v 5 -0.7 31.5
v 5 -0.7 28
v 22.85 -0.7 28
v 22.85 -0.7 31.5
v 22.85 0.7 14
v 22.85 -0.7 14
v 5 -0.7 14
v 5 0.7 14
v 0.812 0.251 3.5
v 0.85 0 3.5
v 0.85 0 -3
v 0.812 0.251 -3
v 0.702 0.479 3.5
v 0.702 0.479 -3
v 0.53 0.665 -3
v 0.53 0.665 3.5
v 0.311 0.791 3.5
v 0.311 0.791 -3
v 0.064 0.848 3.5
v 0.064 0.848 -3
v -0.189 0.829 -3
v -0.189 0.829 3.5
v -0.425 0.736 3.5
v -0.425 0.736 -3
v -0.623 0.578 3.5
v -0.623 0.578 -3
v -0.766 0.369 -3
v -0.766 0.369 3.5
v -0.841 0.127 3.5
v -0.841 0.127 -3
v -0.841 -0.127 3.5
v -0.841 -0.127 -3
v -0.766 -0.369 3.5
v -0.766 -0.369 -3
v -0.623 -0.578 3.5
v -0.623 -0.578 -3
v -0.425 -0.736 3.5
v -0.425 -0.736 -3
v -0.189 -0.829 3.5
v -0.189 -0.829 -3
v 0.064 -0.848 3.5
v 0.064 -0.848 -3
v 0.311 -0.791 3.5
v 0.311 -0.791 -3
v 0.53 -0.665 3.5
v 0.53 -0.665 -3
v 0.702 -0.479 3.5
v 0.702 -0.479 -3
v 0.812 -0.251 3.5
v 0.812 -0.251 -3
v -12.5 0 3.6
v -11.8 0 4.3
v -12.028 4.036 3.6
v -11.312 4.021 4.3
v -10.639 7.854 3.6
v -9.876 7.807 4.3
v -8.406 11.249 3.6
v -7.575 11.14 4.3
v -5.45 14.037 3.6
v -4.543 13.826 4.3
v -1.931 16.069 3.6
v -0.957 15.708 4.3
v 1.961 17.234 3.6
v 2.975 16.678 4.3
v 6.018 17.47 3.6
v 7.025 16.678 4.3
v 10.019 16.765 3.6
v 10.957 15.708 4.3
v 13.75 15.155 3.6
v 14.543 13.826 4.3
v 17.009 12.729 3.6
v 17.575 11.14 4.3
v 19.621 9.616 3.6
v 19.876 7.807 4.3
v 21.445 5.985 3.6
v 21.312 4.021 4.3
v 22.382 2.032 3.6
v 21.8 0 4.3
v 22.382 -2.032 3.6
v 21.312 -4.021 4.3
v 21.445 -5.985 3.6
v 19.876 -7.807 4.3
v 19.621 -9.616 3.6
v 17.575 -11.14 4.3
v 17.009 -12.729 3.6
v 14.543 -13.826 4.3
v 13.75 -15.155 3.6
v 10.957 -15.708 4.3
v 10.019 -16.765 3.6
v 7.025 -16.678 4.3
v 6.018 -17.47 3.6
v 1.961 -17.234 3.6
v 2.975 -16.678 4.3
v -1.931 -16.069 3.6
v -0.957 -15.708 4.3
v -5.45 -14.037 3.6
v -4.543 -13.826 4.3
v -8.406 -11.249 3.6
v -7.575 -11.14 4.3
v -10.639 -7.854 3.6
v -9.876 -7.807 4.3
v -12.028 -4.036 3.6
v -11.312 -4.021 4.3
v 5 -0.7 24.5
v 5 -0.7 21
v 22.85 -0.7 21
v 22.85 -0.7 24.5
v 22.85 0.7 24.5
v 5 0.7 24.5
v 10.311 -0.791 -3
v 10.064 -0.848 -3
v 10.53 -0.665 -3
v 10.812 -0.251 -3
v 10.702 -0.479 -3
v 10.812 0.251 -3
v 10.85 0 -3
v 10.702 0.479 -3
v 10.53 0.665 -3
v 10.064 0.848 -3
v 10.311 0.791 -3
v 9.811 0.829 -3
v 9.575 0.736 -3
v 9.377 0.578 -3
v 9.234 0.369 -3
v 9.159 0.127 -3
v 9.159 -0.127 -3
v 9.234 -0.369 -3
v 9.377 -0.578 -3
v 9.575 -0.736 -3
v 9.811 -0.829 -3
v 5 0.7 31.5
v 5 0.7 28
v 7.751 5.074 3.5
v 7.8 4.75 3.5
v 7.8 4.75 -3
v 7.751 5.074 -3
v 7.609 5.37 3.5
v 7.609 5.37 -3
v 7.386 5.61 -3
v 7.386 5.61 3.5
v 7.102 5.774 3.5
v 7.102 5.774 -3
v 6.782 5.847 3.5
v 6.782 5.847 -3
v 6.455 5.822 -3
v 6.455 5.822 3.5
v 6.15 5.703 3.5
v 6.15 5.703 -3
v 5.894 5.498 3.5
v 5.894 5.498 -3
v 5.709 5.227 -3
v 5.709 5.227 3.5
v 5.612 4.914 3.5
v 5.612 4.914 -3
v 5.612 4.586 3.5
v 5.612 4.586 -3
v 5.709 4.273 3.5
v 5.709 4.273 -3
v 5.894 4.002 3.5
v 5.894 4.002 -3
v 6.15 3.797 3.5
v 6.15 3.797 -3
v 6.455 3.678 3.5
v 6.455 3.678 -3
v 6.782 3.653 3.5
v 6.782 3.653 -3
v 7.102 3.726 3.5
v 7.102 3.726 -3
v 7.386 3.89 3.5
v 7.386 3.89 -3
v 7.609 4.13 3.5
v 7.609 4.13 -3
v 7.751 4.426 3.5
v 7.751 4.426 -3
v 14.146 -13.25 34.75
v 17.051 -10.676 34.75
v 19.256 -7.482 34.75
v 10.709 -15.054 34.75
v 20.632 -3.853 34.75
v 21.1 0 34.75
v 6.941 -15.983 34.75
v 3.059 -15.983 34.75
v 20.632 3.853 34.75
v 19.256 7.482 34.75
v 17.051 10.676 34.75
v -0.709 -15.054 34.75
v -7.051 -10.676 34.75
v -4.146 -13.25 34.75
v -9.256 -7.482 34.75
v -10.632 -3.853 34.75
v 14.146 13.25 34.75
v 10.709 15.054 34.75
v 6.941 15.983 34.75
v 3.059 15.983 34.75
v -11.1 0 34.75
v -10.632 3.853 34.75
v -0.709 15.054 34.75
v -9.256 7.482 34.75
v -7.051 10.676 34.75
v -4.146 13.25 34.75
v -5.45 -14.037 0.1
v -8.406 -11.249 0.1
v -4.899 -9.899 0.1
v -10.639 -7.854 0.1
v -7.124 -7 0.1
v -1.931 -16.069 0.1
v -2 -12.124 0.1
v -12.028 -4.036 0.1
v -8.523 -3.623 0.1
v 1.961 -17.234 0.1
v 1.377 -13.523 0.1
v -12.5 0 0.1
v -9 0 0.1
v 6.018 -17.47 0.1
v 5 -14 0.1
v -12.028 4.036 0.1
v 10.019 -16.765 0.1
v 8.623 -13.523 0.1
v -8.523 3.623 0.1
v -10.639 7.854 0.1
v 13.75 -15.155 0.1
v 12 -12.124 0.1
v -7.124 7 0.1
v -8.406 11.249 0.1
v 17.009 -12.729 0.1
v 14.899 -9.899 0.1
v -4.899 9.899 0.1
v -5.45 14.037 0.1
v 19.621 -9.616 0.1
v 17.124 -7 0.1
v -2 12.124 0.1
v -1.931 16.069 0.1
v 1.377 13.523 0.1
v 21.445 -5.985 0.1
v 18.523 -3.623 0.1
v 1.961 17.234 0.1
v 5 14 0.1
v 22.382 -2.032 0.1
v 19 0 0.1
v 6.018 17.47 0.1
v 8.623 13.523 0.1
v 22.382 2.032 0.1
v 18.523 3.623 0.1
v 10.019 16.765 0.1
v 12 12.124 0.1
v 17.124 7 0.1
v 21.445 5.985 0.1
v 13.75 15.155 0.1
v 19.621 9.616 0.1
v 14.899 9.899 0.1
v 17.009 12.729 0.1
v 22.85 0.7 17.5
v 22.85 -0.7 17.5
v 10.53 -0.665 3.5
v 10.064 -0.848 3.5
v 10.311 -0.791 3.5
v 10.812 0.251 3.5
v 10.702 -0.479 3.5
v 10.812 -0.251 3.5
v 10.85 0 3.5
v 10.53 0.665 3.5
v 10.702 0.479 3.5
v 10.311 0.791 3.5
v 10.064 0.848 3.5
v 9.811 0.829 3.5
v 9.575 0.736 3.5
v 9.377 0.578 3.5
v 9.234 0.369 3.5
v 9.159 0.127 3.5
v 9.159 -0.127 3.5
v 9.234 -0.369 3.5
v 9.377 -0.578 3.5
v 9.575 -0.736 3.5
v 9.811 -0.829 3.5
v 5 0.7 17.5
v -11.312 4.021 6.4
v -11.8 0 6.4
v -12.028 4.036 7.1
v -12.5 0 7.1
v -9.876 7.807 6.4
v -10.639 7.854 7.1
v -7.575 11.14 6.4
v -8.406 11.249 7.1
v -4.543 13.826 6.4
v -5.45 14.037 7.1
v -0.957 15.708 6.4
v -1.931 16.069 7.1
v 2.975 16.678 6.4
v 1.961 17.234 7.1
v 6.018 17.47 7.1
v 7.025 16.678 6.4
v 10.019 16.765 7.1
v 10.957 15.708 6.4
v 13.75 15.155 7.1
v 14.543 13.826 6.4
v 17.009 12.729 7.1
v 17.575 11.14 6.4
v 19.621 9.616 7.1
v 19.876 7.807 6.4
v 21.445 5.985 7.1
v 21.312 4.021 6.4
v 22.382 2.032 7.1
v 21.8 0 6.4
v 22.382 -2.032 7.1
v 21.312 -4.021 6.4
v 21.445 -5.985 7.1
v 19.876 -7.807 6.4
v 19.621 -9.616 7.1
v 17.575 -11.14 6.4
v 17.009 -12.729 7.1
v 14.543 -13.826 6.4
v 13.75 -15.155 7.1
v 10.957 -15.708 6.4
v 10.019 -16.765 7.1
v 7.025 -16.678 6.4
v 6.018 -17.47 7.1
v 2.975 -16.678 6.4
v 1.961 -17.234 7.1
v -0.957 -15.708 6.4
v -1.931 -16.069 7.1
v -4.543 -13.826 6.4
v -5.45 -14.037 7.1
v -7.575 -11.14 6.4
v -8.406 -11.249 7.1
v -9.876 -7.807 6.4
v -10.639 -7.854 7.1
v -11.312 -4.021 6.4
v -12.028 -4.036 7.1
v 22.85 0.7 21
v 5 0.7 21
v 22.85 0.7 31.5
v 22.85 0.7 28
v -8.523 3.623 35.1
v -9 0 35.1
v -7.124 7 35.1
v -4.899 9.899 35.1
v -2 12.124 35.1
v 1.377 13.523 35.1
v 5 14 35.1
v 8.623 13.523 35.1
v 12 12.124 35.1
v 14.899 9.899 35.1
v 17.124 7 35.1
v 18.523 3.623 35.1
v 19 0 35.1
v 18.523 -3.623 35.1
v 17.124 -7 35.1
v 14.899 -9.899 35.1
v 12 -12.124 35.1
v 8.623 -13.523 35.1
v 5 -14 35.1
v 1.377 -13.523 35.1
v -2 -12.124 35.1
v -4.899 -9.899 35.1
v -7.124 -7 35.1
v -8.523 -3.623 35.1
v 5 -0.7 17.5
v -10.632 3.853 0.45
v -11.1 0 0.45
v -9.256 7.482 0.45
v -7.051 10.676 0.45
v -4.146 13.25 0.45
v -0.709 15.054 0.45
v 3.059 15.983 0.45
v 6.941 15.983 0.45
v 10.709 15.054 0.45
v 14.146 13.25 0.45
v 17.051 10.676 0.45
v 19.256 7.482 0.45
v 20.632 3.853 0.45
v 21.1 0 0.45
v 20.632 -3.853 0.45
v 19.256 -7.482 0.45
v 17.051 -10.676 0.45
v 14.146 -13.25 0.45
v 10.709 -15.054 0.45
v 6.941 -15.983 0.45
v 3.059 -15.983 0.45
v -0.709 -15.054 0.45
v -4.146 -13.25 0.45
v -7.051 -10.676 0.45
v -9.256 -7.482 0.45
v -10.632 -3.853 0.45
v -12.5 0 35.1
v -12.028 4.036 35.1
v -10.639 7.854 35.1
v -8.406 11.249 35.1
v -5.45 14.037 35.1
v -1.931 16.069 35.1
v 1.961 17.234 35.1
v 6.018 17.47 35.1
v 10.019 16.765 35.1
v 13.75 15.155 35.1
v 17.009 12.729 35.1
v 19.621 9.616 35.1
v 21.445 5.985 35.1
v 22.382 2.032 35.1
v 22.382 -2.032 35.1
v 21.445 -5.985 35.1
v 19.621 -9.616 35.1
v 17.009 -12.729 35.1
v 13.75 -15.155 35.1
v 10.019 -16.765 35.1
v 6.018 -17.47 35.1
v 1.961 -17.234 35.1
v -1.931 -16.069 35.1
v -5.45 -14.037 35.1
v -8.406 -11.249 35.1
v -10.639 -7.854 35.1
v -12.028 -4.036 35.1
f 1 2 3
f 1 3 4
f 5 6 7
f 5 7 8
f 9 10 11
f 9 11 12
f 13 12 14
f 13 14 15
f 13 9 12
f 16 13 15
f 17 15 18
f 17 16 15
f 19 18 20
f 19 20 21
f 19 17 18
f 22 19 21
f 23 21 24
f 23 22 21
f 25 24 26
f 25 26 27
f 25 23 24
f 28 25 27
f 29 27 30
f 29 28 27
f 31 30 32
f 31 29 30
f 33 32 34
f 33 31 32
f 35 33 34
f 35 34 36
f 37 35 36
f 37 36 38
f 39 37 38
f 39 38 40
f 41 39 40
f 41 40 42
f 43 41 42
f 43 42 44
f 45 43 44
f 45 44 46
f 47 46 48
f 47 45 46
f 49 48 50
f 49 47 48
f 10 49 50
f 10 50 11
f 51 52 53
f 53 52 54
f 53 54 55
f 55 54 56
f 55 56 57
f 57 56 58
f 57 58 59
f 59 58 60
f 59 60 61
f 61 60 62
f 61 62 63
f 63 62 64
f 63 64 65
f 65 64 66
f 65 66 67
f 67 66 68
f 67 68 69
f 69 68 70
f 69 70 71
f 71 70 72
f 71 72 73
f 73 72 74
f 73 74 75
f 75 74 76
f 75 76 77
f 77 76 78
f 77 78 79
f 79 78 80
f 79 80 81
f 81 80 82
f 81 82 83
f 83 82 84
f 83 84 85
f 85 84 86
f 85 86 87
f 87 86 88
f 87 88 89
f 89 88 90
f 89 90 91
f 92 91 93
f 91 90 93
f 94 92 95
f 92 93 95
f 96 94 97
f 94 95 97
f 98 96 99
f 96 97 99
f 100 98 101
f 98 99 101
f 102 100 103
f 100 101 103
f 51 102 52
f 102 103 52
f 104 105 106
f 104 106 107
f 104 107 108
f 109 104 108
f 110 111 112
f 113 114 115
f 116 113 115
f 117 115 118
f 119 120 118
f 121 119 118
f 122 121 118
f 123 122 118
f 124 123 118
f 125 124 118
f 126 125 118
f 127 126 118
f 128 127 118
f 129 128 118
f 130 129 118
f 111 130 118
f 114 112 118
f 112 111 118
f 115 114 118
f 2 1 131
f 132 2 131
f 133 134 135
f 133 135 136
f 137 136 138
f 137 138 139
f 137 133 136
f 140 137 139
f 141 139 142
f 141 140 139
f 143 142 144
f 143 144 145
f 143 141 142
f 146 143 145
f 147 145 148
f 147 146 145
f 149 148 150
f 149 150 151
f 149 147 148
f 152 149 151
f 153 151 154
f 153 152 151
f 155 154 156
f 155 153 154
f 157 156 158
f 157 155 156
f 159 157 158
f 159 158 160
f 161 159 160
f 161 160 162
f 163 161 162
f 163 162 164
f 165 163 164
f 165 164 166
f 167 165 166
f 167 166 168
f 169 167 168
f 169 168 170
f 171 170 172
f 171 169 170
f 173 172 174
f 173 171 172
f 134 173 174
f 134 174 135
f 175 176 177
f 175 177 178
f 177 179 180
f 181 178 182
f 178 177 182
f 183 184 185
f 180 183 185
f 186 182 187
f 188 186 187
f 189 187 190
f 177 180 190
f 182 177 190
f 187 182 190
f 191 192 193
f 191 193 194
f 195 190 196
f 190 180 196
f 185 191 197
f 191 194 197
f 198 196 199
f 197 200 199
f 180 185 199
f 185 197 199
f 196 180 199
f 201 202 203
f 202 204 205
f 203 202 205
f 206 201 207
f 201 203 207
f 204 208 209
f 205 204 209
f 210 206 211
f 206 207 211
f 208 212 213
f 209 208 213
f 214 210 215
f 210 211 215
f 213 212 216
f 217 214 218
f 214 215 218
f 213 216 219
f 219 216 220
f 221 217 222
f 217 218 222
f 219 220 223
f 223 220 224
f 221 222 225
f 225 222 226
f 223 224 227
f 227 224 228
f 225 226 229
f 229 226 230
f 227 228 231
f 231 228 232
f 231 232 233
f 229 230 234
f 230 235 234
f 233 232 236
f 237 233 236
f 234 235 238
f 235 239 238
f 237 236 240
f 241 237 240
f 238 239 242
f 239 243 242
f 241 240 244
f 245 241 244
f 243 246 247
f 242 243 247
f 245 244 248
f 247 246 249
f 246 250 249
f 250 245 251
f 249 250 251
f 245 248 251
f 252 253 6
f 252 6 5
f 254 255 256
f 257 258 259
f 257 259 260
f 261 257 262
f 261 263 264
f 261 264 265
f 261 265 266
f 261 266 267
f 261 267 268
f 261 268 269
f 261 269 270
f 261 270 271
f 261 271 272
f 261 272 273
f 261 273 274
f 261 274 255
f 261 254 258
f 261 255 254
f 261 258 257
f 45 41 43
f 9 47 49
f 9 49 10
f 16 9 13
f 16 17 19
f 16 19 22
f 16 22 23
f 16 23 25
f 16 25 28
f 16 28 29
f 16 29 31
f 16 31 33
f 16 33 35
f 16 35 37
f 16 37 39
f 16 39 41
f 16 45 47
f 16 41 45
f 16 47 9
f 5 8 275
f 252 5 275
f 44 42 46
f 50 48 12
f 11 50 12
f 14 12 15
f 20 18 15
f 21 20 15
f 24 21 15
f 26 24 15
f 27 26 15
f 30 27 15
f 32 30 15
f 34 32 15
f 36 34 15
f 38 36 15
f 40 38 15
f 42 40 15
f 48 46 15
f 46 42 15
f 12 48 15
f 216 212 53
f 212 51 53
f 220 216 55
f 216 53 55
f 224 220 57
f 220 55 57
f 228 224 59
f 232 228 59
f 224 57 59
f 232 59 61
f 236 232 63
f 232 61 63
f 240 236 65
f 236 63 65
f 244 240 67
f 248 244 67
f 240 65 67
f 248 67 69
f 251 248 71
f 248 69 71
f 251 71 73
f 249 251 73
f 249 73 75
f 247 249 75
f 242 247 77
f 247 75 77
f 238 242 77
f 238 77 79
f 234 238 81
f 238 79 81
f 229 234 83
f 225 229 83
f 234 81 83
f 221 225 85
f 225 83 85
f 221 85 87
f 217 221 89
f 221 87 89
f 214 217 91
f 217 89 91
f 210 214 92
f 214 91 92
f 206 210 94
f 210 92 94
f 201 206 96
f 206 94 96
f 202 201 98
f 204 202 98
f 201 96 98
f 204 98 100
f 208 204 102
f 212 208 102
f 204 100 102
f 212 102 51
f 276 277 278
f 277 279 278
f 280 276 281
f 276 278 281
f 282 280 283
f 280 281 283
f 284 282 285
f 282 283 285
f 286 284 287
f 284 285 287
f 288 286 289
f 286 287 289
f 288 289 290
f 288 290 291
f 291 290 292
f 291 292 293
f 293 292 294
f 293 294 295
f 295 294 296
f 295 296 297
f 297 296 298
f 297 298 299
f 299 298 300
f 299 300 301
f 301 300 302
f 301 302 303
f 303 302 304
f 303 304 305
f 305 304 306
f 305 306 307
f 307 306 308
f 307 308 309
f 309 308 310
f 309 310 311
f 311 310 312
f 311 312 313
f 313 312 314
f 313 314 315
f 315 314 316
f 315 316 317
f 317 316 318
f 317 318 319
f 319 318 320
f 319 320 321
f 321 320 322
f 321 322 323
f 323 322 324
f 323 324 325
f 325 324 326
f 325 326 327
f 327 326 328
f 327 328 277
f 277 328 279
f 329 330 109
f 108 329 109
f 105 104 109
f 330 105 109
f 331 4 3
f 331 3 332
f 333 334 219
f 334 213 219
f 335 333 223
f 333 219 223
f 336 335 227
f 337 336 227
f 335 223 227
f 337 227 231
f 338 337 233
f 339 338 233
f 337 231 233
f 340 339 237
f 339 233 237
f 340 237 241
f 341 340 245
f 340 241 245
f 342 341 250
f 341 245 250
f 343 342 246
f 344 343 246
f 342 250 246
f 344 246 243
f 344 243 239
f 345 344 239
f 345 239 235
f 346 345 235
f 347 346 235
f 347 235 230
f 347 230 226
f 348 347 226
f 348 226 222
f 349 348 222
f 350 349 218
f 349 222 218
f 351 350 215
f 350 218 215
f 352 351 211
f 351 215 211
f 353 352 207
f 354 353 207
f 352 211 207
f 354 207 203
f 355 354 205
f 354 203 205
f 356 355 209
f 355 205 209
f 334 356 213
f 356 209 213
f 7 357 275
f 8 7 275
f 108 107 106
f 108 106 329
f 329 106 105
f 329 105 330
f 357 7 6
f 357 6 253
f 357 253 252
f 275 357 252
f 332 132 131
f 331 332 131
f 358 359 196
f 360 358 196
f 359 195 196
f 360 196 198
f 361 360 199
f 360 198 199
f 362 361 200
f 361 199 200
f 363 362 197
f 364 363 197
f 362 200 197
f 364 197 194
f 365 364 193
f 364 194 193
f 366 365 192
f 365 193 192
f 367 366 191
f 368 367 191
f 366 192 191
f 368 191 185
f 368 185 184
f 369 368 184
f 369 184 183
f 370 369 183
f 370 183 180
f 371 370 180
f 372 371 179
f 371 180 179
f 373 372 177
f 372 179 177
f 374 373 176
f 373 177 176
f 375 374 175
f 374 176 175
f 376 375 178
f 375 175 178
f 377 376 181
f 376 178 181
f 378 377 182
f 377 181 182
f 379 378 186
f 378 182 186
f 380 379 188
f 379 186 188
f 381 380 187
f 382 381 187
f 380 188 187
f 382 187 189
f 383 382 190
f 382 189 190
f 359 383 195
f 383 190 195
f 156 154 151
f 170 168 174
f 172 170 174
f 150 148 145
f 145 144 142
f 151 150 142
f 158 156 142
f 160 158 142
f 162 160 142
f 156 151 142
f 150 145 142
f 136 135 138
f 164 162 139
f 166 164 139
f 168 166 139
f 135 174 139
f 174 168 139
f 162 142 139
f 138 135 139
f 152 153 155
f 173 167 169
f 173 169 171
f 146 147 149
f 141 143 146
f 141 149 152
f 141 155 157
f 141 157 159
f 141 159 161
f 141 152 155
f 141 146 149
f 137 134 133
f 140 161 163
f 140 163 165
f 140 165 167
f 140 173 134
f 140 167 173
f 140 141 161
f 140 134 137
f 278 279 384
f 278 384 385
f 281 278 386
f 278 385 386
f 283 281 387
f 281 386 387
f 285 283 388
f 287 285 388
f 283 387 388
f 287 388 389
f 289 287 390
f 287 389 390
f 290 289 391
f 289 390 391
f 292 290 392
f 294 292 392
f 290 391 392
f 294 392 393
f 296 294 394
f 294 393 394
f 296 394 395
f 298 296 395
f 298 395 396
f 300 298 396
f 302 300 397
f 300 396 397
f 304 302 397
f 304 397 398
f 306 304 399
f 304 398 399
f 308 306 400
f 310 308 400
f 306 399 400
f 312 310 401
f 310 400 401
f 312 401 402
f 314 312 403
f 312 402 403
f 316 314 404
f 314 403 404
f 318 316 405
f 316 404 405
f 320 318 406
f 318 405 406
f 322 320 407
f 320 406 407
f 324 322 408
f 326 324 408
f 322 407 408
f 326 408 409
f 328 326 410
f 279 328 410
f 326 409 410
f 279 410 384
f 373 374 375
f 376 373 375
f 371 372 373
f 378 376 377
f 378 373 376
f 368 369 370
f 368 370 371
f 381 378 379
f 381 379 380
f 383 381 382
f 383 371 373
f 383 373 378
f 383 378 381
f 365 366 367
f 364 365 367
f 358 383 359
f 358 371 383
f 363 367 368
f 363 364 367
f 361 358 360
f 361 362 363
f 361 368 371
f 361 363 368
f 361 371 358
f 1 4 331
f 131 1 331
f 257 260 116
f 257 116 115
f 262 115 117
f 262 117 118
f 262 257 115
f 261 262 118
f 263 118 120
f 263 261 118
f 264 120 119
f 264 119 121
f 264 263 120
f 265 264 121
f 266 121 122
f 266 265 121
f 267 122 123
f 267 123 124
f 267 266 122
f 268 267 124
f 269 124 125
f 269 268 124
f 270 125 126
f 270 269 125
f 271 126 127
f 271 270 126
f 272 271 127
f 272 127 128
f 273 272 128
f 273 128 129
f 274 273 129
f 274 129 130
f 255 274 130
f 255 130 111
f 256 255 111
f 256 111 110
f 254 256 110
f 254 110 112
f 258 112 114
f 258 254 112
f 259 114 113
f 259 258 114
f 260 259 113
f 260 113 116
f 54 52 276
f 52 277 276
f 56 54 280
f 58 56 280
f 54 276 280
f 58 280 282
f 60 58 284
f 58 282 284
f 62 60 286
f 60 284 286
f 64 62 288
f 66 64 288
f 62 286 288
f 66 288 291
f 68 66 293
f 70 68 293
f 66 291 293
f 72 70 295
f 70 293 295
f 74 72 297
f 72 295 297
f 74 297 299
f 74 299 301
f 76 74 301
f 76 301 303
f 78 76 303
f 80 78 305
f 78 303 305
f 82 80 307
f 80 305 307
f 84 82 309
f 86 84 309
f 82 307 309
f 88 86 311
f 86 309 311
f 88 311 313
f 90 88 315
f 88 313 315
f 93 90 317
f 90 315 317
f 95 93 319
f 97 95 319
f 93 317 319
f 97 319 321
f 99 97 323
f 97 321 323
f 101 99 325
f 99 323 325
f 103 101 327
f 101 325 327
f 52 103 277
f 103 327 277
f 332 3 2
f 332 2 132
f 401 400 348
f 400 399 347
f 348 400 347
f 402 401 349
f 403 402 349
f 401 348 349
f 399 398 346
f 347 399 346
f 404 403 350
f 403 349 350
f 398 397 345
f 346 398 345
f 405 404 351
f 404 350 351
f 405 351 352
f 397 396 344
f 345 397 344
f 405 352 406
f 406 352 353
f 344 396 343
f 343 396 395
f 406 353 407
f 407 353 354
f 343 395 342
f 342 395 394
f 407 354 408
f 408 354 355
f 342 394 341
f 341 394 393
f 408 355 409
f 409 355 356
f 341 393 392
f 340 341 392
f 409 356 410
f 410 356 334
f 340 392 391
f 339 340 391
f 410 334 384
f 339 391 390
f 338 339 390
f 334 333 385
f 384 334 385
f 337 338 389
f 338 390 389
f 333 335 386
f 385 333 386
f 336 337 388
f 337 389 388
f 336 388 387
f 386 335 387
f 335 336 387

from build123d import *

# Parameters (mm, degrees)
SKETCH002_W   = 16.1
SKETCH002_H   = 34.3
SKETCH003_R   = 0.85
SKETCH003_R_2 = 1.1
PAD_DEPTH     = 6.5
SKETCH004_W   = 1.4
SKETCH004_H   = 3.5
PAD001_DEPTH  = 17.85


with BuildPart() as revolution:
    # Sketch → Revolution (revolve)
    with BuildSketch(Plane.XZ):
        Polygon((-12.5, 0.1), (-12.5, 3.6), (-11.8, 4.3), (-11.8, 6.4), (-12.5, 7.1), (-12.5, 35.1), (-9, 35.1), (-9, 0.1), align=None)
    revolve(axis=Axis((5, 0, 7.548619), (0, 0, -1)))


with BuildPart() as revolution001:
    # Sketch002 → Revolution001 (revolve)
    with BuildSketch(Plane.XZ):
        with Locations((-3.05, 17.6)):
            Rectangle(SKETCH002_W, SKETCH002_H)
    revolve(axis=Axis((5, 0, 4.680116), (0, 0, -1)))


with BuildPart() as pad:
    # Sketch003 → Pad (new body)
    with BuildSketch(Plane.XY.offset(3.5)):
        Circle(SKETCH003_R)
        with Locations((10, 0)):
            Circle(SKETCH003_R)
        with Locations((6.7, 4.75)):
            Circle(SKETCH003_R_2)
    extrude(amount=-PAD_DEPTH)


with BuildPart() as pad001:
    # Sketch004 → Pad001 (new body)
    with BuildSketch(Plane.YZ.offset(5)):
        with Locations((0, 15.75)):
            Rectangle(SKETCH004_W, SKETCH004_H)
        with Locations((0, 22.75)):
            Rectangle(SKETCH004_W, SKETCH004_H)
        with Locations((0, 29.75)):
            Rectangle(SKETCH004_W, SKETCH004_H)
    extrude(amount=PAD001_DEPTH)


solid = Compound([revolution.part, revolution001.part, pad.part, pad001.part])
